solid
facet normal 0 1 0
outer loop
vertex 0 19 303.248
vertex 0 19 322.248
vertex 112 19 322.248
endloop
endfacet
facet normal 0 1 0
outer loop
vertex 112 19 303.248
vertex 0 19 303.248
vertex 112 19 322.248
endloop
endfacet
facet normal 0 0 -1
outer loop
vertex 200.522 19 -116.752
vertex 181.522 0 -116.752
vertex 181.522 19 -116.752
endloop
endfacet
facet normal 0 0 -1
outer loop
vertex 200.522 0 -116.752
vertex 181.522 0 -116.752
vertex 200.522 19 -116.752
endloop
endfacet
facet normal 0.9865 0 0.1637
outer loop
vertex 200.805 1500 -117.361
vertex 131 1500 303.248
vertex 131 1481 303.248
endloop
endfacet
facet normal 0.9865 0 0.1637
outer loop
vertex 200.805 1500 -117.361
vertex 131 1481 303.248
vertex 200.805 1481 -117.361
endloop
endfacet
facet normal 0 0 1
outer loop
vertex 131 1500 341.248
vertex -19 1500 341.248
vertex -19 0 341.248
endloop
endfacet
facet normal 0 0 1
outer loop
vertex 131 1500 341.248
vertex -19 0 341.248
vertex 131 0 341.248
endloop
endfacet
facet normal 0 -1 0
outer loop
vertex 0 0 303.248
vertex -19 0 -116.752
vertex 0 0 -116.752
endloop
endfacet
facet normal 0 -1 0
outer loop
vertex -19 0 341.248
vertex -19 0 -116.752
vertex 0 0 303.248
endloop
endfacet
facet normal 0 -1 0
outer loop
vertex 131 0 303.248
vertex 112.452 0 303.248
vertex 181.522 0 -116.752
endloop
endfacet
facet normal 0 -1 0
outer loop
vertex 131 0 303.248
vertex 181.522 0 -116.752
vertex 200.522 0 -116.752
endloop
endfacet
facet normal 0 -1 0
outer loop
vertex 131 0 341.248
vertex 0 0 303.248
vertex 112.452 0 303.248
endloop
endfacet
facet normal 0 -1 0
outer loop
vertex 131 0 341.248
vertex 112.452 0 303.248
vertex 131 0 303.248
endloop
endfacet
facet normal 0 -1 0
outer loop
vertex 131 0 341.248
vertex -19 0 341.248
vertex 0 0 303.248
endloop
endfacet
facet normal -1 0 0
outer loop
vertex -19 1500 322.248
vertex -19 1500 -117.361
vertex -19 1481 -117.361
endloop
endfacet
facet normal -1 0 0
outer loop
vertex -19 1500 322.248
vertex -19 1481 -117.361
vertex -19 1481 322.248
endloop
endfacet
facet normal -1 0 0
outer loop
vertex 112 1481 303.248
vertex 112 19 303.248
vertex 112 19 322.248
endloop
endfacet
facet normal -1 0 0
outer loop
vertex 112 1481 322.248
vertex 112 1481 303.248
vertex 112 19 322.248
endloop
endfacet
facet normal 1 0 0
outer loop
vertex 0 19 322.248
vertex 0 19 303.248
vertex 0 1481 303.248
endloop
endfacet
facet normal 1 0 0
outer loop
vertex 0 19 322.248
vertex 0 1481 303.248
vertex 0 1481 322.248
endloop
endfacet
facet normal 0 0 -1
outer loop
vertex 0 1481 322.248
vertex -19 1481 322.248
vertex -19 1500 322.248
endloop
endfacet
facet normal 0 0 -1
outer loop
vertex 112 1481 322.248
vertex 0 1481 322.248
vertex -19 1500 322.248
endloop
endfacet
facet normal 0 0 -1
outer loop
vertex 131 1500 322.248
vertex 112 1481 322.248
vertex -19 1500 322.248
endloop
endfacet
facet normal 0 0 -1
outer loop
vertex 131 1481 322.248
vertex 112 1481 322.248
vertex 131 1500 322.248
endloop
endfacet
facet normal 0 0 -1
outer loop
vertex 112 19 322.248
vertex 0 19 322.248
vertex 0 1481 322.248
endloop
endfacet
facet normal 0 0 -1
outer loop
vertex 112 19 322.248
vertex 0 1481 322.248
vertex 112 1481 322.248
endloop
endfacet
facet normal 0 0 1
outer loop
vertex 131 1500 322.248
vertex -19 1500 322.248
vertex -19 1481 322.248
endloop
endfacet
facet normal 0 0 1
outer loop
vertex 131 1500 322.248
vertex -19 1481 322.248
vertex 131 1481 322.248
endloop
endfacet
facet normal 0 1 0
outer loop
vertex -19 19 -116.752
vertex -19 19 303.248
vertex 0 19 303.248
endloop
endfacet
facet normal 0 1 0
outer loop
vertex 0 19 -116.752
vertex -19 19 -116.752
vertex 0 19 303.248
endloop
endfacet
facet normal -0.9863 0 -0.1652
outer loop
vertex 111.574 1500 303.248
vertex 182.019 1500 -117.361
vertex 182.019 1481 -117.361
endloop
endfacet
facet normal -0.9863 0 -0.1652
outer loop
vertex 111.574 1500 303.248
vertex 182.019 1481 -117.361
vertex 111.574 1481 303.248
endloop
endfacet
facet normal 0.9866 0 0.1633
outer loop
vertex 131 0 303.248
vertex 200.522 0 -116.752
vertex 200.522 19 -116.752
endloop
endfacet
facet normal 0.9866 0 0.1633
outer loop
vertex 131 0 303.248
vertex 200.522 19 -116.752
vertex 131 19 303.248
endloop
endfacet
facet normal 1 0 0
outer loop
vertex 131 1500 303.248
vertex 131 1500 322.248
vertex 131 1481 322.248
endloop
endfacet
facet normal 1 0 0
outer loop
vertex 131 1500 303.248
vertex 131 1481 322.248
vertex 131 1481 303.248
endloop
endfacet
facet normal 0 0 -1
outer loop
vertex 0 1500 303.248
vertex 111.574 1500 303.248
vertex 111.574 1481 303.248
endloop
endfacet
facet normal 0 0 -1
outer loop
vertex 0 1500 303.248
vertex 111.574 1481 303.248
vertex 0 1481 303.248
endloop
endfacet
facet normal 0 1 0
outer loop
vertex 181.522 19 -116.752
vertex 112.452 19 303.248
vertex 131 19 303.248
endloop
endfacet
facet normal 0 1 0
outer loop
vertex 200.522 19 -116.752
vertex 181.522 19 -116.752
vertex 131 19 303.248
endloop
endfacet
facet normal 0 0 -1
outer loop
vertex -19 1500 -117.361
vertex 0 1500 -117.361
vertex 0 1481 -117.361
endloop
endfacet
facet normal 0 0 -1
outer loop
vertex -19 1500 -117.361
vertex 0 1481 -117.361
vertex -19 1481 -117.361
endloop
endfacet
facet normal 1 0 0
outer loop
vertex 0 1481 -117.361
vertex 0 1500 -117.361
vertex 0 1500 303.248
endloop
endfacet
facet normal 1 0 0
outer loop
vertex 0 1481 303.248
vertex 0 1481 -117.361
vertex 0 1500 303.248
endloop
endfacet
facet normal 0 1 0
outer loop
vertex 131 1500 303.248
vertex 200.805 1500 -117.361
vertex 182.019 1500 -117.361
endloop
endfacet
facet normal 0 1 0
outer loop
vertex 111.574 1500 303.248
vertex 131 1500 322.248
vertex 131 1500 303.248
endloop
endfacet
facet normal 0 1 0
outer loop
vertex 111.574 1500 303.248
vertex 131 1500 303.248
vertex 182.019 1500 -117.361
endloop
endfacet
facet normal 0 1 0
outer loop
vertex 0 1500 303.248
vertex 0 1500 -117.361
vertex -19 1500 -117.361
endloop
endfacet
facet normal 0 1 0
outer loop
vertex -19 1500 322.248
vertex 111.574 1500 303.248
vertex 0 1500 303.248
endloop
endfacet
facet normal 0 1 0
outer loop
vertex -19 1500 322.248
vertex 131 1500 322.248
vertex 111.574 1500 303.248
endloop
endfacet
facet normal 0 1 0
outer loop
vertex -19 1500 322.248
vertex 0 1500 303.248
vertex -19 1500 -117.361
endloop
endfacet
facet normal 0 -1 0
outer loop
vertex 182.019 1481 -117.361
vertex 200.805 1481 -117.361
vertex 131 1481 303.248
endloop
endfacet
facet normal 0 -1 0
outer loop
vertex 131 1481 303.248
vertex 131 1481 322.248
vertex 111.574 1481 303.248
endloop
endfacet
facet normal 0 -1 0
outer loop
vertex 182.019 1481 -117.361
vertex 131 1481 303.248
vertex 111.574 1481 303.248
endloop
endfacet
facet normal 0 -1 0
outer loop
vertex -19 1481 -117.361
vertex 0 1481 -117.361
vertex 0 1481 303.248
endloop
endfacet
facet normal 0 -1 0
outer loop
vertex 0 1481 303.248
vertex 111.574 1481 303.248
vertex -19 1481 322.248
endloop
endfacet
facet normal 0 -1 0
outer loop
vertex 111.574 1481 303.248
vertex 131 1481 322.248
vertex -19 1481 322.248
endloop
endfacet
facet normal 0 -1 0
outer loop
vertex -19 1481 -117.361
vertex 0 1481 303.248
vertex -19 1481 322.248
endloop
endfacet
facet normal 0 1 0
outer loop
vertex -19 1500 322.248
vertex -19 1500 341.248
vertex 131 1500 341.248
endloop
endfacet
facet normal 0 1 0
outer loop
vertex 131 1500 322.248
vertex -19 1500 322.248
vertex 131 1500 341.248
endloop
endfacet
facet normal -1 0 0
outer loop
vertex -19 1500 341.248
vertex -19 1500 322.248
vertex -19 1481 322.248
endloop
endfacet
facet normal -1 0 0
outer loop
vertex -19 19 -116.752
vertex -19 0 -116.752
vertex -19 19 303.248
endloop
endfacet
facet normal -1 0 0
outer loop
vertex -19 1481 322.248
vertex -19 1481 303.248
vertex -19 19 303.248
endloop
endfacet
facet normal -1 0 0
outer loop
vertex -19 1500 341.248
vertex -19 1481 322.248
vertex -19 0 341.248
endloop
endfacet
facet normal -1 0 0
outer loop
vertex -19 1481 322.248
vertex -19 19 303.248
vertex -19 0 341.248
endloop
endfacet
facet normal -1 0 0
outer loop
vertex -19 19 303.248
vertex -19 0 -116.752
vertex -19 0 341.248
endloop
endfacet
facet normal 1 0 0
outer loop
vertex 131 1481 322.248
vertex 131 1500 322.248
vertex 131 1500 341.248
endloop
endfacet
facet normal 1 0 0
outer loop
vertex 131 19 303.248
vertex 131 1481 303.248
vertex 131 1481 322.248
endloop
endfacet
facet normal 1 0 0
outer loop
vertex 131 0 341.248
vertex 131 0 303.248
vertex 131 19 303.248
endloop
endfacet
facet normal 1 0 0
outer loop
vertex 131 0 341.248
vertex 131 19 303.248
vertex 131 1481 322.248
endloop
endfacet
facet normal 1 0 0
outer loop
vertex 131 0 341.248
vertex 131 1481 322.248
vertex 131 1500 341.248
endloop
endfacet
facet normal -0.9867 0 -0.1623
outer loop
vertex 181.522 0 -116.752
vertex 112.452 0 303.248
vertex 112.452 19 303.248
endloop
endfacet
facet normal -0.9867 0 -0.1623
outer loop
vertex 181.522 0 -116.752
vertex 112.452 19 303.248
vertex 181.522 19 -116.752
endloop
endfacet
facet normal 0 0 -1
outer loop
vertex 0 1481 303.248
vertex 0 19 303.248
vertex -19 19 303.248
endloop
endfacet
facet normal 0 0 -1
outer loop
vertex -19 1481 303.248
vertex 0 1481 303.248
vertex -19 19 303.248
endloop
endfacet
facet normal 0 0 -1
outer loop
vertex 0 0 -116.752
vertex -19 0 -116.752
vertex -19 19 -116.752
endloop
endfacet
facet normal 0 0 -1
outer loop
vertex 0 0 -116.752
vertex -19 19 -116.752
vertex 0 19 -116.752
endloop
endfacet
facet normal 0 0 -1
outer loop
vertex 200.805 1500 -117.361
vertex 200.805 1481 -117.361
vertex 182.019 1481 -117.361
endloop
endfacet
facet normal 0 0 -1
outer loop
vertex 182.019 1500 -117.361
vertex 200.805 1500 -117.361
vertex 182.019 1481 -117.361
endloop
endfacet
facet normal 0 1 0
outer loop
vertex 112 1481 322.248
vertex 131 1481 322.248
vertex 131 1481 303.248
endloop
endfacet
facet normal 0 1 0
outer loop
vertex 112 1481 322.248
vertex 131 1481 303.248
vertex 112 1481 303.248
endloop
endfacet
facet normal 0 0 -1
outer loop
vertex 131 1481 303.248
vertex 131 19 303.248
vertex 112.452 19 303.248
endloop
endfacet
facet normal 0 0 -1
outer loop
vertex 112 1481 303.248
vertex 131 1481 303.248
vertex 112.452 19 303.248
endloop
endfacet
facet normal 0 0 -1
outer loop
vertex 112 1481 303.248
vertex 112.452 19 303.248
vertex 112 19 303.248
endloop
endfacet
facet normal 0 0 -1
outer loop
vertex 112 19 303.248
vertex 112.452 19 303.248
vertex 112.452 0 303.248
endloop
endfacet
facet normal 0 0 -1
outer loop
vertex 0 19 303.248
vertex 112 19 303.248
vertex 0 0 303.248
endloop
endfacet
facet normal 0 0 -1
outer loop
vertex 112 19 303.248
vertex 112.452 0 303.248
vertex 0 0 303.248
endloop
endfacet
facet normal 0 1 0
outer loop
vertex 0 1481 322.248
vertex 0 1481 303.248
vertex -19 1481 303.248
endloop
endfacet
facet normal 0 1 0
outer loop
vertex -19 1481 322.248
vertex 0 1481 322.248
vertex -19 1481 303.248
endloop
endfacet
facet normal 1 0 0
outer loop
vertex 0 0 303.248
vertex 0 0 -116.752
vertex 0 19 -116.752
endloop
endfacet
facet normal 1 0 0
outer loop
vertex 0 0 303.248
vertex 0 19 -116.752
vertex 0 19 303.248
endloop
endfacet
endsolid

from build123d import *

# Parameters (mm, degrees)
F0_W     = 19
F0_H     = 420
F1_DEPTH = 19
F0_W_2   = 150
F0_H_2   = 19
F2_DEPTH = 1500
F4_W     = 19
F4_H     = 19
F5_DEPTH = 1462
F7_W     = 19
F7_H     = 420.6086155772
F8_DEPTH = 19


with BuildPart() as f1:
    # F0 (on Front) → F1 (new body)
    with BuildSketch(Plane.XZ):
        Polygon((131, 322.2475617528), (-19, 322.2475617528), (-19, 303.2475617528), (0, 303.2475617528), (112.4515682459, 303.2475617528), (131, 303.2475617528), align=None)
        with Locations((-9.5, 93.2475617528)):
            Rectangle(F0_W, F0_H)
        Polygon((200.5219459534, -116.7524382472), (131, 303.2475617528), (112.4515682459, 303.2475617528), (181.5219459534, -116.7524382472), align=None)
    extrude(amount=-F1_DEPTH)

    # F0 (on Front) → F2 (join)
    with BuildSketch(Plane.XZ):
        with Locations((56, 331.7475617528)):
            Rectangle(F0_W_2, F0_H_2)
    extrude(amount=-F2_DEPTH)

    # F4 (on offset) → F5 (join)
    with BuildSketch(Plane(origin=(0, 19, 0), x_dir=(-1, 0, 0), z_dir=(0, 1, 0))):
        with Locations((-121.5, 312.7475617528)):
            Rectangle(F4_W, F4_H)
        with Locations((9.5, 312.7475617528)):
            Rectangle(F4_W, F4_H)
    extrude(amount=F5_DEPTH)


with BuildPart() as f8:
    # F7 (on offset) → F8 (new body)
    with BuildSketch(Plane(origin=(0, 1500, 0), x_dir=(-1, 0, 0), z_dir=(0, 1, 0))):
        Polygon((19, 322.2475617528), (-131, 322.2475617528), (-131, 303.2475617528), (-111.5736439824, 303.2475617528), (0, 303.2475617528), (19, 303.2475617528), align=None)
        Polygon((-111.5736439824, 303.2475617528), (-131, 303.2475617528), (-200.8045464754, -117.3610538244), (-182.0190995932, -117.3610538244), align=None)
        with Locations((9.5, 92.9432539642)):
            Rectangle(F7_W, F7_H)
    extrude(amount=-F8_DEPTH)


solid = Compound([f1.part, f8.part])
